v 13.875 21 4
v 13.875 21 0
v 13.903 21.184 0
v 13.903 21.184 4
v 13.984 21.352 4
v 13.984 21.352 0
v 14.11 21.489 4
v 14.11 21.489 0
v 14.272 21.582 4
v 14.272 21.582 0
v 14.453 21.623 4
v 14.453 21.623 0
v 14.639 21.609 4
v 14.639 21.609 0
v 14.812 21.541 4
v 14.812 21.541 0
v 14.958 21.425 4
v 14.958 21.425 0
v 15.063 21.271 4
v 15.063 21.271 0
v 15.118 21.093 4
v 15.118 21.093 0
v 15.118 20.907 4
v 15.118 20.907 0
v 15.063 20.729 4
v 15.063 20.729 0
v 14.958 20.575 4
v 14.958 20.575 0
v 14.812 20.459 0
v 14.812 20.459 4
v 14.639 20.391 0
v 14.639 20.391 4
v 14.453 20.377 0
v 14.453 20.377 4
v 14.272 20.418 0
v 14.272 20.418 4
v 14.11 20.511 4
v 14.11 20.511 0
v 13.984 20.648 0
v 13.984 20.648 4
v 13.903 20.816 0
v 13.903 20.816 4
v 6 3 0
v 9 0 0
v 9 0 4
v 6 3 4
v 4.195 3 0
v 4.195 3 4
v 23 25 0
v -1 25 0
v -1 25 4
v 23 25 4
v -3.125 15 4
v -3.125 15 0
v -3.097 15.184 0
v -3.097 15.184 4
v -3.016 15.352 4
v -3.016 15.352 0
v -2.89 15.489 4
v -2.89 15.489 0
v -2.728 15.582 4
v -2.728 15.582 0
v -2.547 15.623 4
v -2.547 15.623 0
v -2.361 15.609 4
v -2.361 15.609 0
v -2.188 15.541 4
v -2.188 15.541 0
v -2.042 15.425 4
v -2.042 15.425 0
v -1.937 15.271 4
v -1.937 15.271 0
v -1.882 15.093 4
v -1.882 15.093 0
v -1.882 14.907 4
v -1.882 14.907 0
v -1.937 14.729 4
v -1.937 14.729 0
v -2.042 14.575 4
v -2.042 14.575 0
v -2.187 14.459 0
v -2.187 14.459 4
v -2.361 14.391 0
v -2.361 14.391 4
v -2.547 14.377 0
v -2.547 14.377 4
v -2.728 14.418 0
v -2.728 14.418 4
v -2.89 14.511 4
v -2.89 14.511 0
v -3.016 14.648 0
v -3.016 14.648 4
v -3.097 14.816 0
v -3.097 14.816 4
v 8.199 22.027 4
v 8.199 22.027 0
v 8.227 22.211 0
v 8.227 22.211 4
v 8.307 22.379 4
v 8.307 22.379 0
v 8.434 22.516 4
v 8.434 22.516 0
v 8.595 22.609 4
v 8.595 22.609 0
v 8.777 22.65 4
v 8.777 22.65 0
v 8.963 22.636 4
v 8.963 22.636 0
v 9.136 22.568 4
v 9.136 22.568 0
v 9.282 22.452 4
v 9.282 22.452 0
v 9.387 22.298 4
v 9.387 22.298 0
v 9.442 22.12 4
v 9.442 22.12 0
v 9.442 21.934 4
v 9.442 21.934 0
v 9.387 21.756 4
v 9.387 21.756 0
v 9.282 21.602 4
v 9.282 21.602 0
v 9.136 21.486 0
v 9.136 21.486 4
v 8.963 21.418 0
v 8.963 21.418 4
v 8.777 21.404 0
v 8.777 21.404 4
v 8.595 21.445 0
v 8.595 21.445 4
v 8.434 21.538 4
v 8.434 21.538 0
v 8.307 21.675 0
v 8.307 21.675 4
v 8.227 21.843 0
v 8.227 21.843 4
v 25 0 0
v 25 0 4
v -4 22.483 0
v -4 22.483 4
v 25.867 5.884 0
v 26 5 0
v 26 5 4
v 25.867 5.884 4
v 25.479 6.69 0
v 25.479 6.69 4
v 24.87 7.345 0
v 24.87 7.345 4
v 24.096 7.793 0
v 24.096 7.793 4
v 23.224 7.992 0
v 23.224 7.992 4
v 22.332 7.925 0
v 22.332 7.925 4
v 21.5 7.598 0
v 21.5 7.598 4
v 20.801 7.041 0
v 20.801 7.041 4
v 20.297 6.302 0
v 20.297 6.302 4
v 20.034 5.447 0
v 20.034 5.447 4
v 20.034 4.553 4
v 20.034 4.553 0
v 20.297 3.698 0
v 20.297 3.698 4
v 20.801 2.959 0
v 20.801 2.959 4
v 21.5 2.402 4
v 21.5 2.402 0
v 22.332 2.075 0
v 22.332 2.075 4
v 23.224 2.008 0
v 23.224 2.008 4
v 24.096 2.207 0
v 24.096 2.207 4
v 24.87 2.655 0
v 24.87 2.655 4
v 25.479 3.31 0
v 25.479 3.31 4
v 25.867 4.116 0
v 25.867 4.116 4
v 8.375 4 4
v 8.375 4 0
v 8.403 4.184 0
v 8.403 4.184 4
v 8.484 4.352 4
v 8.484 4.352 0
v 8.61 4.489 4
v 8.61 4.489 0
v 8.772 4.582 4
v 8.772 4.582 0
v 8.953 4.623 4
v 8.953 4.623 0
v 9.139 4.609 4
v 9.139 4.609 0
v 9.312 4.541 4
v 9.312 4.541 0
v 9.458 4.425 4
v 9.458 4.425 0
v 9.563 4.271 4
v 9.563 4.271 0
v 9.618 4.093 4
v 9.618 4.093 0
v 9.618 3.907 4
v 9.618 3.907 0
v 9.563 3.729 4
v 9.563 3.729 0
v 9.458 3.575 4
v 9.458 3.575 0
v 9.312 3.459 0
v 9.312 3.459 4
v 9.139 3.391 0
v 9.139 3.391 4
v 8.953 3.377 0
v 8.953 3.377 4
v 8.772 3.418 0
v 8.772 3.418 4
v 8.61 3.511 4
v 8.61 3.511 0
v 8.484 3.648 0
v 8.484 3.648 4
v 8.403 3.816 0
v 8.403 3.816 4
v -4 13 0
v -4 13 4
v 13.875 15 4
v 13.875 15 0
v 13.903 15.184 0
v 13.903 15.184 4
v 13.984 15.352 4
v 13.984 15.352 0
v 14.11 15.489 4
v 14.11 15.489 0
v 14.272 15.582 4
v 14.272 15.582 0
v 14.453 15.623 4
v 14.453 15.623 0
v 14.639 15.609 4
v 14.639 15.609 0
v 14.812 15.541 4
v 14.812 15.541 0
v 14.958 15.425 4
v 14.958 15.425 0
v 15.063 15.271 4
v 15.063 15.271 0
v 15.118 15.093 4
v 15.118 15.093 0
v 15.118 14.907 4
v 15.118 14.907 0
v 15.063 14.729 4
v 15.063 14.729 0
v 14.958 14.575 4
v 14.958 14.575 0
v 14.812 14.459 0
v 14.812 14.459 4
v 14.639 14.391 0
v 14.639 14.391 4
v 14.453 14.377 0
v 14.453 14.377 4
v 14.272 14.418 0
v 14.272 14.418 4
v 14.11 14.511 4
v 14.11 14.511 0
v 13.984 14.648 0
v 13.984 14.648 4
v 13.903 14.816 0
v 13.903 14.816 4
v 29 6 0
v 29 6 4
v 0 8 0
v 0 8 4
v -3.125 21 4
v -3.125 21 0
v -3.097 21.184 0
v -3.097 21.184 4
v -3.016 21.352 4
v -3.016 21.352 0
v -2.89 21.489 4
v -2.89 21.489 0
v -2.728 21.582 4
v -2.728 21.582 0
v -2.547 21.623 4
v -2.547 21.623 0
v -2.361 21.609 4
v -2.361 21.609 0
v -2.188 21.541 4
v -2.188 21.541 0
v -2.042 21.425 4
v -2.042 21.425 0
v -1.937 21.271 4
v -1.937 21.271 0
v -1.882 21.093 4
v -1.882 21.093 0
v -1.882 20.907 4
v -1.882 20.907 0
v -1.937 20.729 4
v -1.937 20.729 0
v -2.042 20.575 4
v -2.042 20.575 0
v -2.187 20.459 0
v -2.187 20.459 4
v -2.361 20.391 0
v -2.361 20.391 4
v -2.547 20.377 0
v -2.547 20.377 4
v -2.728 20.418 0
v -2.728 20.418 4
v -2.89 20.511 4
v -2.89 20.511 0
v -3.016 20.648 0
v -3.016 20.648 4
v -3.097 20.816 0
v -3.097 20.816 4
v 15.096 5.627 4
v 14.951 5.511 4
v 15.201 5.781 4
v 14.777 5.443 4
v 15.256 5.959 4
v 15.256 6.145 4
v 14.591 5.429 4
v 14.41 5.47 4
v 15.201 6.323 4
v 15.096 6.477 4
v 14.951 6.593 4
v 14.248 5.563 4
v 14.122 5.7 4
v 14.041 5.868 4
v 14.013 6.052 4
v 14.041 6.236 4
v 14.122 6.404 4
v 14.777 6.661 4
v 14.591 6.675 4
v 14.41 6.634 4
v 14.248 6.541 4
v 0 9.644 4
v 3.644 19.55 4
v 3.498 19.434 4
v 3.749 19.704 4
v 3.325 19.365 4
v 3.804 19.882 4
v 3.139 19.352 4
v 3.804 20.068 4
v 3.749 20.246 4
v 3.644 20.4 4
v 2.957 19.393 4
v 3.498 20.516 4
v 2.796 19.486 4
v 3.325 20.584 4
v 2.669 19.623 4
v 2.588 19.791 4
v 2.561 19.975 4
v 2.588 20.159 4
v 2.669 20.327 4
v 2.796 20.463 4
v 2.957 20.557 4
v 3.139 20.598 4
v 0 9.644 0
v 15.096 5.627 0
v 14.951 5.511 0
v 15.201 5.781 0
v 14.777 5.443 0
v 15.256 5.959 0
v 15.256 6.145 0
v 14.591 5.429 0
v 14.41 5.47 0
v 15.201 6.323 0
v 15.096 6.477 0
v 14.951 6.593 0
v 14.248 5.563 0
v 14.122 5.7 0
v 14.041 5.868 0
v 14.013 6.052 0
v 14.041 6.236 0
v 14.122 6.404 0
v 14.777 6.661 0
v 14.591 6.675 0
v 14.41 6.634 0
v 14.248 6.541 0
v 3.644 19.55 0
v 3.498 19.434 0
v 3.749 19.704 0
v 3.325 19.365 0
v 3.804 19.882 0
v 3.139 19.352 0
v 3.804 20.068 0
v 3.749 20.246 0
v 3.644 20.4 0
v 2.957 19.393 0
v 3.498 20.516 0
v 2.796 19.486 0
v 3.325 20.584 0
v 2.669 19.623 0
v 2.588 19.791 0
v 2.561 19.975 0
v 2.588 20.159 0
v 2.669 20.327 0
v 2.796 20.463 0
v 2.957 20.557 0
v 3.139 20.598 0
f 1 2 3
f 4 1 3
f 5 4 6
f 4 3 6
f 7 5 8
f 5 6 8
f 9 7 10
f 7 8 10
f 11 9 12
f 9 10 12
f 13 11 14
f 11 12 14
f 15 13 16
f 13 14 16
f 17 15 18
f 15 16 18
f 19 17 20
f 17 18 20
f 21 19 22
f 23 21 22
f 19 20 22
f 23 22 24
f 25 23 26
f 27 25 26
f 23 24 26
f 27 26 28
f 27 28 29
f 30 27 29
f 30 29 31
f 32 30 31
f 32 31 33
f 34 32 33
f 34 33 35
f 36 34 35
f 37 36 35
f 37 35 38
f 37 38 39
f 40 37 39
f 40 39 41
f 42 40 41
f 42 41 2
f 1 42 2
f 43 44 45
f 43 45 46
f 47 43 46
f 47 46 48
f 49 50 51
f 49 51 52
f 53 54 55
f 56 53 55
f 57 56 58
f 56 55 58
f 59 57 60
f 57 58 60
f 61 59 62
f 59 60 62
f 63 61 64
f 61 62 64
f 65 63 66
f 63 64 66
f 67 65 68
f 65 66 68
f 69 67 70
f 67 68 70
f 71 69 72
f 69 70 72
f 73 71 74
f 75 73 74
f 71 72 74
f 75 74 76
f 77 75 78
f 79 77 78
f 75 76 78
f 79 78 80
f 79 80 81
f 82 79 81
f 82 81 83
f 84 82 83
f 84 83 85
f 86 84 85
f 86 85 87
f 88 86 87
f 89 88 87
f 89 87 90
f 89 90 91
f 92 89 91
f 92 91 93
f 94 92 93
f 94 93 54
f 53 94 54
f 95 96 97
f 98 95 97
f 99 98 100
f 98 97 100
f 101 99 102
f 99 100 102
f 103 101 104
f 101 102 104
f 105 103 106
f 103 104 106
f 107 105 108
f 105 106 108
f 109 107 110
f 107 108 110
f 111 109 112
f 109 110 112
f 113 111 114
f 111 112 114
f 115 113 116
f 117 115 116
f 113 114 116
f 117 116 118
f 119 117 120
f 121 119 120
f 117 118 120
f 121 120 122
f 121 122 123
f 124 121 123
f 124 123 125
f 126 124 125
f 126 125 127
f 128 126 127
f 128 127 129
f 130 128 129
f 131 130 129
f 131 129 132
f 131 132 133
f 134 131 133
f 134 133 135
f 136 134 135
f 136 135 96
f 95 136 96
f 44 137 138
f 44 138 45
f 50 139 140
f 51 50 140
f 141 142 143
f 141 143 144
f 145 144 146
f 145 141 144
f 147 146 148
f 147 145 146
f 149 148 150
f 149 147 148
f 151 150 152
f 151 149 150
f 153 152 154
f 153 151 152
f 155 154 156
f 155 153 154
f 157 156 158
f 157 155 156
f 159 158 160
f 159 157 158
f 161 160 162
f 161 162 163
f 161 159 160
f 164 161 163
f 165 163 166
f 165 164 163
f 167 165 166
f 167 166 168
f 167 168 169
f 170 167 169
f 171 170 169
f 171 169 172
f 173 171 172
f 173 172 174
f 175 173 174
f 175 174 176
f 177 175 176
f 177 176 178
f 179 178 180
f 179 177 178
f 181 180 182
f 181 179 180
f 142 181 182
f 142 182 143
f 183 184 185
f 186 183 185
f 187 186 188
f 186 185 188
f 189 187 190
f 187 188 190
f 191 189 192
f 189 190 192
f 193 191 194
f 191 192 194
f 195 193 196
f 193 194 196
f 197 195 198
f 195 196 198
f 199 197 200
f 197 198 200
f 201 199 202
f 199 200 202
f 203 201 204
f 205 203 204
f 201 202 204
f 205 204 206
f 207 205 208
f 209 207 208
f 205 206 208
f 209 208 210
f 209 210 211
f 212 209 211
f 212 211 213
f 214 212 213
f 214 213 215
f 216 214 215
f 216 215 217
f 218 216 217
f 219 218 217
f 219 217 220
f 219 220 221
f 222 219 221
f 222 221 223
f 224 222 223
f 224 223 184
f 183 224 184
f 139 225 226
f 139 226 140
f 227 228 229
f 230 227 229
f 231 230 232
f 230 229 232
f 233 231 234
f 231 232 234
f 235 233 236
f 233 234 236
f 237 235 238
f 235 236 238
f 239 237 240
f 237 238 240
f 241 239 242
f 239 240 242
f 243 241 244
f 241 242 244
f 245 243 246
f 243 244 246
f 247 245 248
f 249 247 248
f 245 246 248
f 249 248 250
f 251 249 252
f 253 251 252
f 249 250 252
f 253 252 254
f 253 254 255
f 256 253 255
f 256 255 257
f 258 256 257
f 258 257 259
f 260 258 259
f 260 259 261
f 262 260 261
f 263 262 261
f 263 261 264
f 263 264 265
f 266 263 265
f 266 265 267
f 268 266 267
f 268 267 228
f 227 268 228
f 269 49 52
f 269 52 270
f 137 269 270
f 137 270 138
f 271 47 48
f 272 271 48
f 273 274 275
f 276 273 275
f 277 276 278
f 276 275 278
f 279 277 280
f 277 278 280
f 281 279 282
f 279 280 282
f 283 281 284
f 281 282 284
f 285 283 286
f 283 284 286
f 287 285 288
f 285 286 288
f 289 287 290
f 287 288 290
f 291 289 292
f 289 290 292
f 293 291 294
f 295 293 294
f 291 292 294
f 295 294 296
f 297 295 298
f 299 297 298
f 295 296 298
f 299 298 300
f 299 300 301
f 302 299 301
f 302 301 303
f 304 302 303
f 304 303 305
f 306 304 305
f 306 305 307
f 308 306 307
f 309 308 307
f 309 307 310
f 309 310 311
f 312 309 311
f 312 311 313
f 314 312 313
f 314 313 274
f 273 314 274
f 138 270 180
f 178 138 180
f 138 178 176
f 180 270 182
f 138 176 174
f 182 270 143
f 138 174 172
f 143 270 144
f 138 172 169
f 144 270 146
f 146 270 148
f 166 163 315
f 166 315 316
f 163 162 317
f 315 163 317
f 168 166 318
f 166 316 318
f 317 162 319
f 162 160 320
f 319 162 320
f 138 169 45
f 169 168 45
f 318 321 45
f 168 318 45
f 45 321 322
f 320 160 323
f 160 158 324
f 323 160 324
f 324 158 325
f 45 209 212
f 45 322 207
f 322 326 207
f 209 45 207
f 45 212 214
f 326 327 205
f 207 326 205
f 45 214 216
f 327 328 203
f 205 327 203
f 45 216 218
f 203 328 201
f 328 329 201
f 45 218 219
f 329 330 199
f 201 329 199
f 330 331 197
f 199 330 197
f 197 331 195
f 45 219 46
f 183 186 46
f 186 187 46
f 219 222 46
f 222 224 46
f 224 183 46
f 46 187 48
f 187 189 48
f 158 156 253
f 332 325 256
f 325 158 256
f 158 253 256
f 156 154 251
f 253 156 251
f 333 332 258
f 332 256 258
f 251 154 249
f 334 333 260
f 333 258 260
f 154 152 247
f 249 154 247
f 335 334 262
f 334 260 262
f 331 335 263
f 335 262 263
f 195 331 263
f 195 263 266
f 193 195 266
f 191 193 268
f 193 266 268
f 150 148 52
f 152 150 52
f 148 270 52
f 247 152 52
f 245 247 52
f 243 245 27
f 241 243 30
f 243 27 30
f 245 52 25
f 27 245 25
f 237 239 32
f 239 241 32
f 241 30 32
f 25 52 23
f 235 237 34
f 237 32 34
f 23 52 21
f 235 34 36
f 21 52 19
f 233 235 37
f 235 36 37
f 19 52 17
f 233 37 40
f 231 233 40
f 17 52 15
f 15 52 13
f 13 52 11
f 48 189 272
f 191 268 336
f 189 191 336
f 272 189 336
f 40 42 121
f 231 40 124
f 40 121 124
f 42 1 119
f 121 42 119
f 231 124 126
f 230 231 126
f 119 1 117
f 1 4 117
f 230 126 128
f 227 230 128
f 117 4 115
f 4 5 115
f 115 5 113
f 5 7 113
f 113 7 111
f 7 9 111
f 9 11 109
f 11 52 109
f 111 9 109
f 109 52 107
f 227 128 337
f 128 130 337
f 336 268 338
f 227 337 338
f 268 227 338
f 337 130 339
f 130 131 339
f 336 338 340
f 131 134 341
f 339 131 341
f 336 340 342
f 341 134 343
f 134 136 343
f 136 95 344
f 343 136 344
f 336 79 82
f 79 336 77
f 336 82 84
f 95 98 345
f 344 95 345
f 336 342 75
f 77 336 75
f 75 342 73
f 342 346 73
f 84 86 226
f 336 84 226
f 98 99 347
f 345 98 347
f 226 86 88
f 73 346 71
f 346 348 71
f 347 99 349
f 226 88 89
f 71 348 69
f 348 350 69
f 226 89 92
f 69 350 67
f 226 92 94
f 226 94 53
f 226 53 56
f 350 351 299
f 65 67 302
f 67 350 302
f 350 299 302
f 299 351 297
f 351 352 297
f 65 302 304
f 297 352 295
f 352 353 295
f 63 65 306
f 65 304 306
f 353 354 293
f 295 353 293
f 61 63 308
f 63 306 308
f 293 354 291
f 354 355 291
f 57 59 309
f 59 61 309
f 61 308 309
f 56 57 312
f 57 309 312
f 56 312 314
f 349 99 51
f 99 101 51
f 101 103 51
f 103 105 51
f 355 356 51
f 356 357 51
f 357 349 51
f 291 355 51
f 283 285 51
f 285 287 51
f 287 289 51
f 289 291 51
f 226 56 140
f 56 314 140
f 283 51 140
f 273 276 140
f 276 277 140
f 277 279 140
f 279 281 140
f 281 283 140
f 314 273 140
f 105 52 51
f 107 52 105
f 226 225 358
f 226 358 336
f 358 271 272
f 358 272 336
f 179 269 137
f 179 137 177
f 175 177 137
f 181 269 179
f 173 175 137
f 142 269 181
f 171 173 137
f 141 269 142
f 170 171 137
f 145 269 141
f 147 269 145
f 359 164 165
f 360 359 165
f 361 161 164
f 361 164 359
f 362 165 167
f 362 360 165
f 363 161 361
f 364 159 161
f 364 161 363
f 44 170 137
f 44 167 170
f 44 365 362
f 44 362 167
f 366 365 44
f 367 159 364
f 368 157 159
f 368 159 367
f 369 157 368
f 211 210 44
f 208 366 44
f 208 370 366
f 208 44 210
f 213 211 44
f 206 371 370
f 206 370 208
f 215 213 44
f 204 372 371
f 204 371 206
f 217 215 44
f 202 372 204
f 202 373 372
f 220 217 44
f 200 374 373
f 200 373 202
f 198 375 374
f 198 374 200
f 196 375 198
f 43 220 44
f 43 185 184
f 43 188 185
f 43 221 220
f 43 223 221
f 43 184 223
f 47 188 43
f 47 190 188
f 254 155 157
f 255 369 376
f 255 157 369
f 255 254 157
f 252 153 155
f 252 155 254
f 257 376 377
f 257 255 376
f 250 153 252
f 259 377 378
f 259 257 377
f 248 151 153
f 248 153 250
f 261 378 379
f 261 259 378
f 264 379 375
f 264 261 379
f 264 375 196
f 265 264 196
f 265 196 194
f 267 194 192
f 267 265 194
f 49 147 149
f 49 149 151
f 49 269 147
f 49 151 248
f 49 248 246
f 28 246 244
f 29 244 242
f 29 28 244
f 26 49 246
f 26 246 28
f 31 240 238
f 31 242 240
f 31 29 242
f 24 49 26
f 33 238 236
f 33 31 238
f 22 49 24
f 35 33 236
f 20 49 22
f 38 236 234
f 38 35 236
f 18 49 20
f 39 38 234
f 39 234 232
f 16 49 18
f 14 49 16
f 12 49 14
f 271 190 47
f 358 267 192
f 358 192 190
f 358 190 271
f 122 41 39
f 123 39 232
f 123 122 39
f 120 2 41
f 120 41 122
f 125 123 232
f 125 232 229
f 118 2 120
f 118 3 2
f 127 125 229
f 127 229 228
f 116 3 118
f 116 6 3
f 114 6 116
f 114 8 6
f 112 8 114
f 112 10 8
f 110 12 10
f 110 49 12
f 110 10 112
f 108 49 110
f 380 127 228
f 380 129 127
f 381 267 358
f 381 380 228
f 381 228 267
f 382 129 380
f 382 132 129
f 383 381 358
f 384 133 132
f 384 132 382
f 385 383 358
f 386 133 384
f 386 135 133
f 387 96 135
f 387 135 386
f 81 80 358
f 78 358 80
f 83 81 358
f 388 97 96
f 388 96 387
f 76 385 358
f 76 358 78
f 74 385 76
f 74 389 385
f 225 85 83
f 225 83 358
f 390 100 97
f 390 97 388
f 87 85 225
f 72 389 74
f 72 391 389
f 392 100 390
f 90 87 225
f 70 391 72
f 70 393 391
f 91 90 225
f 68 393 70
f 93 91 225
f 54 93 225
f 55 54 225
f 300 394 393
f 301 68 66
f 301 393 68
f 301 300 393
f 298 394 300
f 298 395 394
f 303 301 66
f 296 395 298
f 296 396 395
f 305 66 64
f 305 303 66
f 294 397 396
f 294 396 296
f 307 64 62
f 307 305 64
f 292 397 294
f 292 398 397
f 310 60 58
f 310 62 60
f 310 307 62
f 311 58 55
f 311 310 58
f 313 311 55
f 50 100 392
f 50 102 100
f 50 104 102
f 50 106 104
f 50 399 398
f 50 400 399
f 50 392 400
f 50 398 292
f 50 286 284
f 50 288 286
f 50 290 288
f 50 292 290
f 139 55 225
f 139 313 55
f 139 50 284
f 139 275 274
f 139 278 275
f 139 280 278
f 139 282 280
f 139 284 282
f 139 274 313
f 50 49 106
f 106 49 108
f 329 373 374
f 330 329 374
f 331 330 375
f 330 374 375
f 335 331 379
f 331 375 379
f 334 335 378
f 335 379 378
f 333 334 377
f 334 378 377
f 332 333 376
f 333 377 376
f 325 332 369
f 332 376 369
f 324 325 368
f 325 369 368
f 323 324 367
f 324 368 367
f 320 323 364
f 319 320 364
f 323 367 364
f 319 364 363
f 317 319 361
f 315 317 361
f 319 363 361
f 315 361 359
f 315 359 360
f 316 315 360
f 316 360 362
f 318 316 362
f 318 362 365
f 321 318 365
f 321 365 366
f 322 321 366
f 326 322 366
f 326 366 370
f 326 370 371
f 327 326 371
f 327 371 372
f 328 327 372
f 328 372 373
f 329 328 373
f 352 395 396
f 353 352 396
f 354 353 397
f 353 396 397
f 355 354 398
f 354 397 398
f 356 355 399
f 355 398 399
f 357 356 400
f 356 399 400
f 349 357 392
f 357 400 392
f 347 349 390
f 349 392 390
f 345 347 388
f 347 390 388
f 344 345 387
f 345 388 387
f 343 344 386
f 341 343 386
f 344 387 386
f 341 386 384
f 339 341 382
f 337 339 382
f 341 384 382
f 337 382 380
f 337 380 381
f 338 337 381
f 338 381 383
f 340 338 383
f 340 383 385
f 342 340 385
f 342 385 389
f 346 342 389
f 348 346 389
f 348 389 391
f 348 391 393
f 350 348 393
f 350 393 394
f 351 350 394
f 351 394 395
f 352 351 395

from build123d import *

# Parameters (mm, degrees)
SKETCH_1_R               = 3
EXTRUDE_1_DEPTH          = 4
HOLE_WIZARD_M1_6_1_D     = 1.25
HOLE_WIZARD_M1_6_1_DEPTH = 4.95
HOLE_WIZARD_M1_6_1_TIP   = 0.375537887
HOLE_WIZARD_M1_6_2_D     = 1.25
HOLE_WIZARD_M1_6_2_DEPTH = 4.95
HOLE_WIZARD_M1_6_2_TIP   = 0.375537887
CHAMFER_1_SIZE           = 5
CHAMFER_1_SIZE2          = 4.195498156
CHAMFER_2_SIZE2          = 4
CHAMFER_2_SIZE           = 3.356398525
CHAMFER_4_SIZE           = 3
CHAMFER_4_SIZE2          = 2.517298894


with BuildPart() as part:
    # 草图1 → 凸台-拉伸1 (new body)
    with BuildSketch(Plane.XY):
        Polygon((0, 3), (0, 13), (-4, 13), (-4, 25), (23, 25), (29, 6), (25, 0), (9, 0), (6, 3), align=None)
        with Locations((23, 5)):
            Circle(SKETCH_1_R, mode=Mode.SUBTRACT)
    extrude(amount=EXTRUDE_1_DEPTH)

    # M1.6 螺纹孔1
    with Locations(Plane.XY.offset(4)):
        with Locations((-2.5, 21), (14.5, 21), (14.5, 15), (-2.5, 15)):
            Hole(HOLE_WIZARD_M1_6_1_D / 2, depth=HOLE_WIZARD_M1_6_1_DEPTH)
            with Locations((0, 0, -(HOLE_WIZARD_M1_6_1_DEPTH + HOLE_WIZARD_M1_6_1_TIP / 2))):  # 118° drill point
                Cone(0, HOLE_WIZARD_M1_6_1_D / 2, HOLE_WIZARD_M1_6_1_TIP, mode=Mode.SUBTRACT)

    # M1.6 螺纹孔2
    with Locations(Plane.XY.offset(4)):
        with Locations((8.823813288, 22.026895413), (14.638155725, 6.05212086), (9, 4), (3.185657563, 19.974774553)):
            Hole(HOLE_WIZARD_M1_6_2_D / 2, depth=HOLE_WIZARD_M1_6_2_DEPTH)
            with Locations((0, 0, -(HOLE_WIZARD_M1_6_2_DEPTH + HOLE_WIZARD_M1_6_2_TIP / 2))):  # 118° drill point
                Cone(0, HOLE_WIZARD_M1_6_2_D / 2, HOLE_WIZARD_M1_6_2_TIP, mode=Mode.SUBTRACT)

    # 倒角1
    chamfer_1_edges = [part.edges().sort_by_distance(p)[0] for p in [
        (0, 3, 2),
    ]]
    chamfer_1_side = [part.faces().sort_by_distance(p)[0] for p in [
        (0, 8, 2),
    ]]
    chamfer(chamfer_1_edges, length=CHAMFER_1_SIZE, length2=CHAMFER_1_SIZE2, reference=chamfer_1_side[0])

    # 倒角2
    chamfer_2_edges = [part.edges().sort_by_distance(p)[0] for p in [
        (0, 13, 2),
    ]]
    chamfer_2_side = [part.faces().sort_by_distance(p)[0] for p in [
        (0, 12.93287203, 2),
    ]]
    chamfer(chamfer_2_edges, length=CHAMFER_2_SIZE - 0.0001, length2=CHAMFER_2_SIZE2 - 0.0001, reference=chamfer_2_side[0])  # a hair under: the kernel refuses the full size

    # 倒角4
    chamfer_4_edges = [part.edges().sort_by_distance(p)[0] for p in [
        (-4, 25, 2),
    ]]
    chamfer_4_side = [part.faces().sort_by_distance(p)[0] for p in [
        (9.5, 25, 2),
    ]]
    chamfer(chamfer_4_edges, length=CHAMFER_4_SIZE, length2=CHAMFER_4_SIZE2, reference=chamfer_4_side[0])


solid = part.part
